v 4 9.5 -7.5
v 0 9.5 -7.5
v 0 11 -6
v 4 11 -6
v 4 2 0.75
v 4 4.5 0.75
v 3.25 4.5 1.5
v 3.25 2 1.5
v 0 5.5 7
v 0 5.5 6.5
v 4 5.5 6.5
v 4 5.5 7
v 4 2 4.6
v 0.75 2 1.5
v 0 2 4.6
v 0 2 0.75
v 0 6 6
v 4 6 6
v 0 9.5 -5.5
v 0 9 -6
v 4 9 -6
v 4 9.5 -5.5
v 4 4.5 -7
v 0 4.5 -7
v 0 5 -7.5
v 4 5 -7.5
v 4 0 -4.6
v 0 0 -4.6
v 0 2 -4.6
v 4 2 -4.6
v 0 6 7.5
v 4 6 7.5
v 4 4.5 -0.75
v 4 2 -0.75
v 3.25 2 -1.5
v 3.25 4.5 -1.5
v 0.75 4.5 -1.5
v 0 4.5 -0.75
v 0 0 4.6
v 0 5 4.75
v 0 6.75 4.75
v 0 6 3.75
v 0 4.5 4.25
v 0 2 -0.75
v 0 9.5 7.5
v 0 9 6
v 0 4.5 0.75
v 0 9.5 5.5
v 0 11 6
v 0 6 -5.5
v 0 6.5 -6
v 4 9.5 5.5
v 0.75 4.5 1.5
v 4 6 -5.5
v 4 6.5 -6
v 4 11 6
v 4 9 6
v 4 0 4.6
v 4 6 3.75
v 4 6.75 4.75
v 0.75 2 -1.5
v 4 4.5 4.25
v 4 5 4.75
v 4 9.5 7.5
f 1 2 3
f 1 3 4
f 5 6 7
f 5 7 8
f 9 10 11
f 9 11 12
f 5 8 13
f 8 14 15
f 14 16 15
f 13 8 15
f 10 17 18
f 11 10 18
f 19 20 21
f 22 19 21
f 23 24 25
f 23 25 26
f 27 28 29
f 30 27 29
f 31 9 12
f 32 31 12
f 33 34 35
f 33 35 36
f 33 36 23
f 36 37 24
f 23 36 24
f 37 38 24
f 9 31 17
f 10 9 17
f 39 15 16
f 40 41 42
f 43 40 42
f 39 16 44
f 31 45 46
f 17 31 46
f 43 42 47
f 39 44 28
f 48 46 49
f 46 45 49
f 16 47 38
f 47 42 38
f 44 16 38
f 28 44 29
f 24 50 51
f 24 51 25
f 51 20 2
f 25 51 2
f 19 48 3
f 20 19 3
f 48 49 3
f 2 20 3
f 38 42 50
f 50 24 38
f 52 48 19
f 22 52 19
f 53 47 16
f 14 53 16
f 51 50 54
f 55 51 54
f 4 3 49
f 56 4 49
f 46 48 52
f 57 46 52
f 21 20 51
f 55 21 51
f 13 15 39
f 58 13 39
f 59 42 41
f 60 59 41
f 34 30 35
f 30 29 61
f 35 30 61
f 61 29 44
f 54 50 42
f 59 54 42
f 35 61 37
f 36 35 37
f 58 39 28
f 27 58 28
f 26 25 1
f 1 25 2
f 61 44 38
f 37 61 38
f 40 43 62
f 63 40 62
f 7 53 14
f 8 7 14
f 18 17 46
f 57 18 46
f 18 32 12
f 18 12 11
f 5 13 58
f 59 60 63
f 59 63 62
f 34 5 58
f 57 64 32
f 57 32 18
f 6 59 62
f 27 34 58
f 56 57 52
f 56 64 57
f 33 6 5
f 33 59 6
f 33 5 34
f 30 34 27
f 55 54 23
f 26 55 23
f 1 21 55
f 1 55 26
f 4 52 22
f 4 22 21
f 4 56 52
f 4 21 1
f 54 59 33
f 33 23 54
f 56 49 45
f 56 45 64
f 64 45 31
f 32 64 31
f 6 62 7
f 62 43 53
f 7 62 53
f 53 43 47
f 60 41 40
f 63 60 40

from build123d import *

# Parameters (mm, degrees)
BOSS_EXTRUDE1_DEPTH = 4
CHAMFER1_SIZE       = 0.75
SKETCH2_W           = 1.5
SKETCH2_H           = 1
CUT_EXTRUDE1_DEPTH  = 14.901438774
CHAMFER2_SIZE       = 1.5
CHAMFER3_SIZE       = 0.5


with BuildPart() as part:
    # Sketch1 → Boss-Extrude1 (new body)
    with BuildSketch(Plane(origin=(0, 0, 0), x_dir=(0, 0, -1), z_dir=(1, 0, 0))):
        Polygon((-4.6, 0), (4.6, 0), (4.6, 2), (1.5, 2), (1.5, 4.5), (7.5, 4.5), (7.5, 11), (-7.5, 11), (-7.5, 4.5), (-6, 4.5), (-6, 6), (-6, 9.5), (6, 9.5), (6, 6), (-3.75, 6), (-4.75, 6.75), (-4.75, 6), (-4.75, 4.5), (-1.5, 4.5), (-1.5, 2), (-4.6, 2), align=None)
    extrude(amount=BOSS_EXTRUDE1_DEPTH)

    # Chamfer1
    chamfer1_edges = [part.edges().sort_by_distance(p)[0] for p in [
        (0, 3.25, 1.5),
        (0, 3.25, -1.5),
        (4, 3.25, 1.5),
        (4, 3.25, -1.5),
    ]]
    chamfer(chamfer1_edges, length=CHAMFER1_SIZE)

    # Sketch2 → Cut-Extrude1 (cut, through all)
    with BuildSketch(Plane.ZY):
        with Locations((6.75, 5)):
            Rectangle(SKETCH2_W, SKETCH2_H)
    extrude(amount=-CUT_EXTRUDE1_DEPTH, mode=Mode.SUBTRACT)

    # Chamfer2
    chamfer2_edges = [part.edges().sort_by_distance(p)[0] for p in [
        (2, 11, 7.5),
        (2, 11, -7.5),
    ]]
    chamfer(chamfer2_edges, length=CHAMFER2_SIZE)

    # Chamfer3
    chamfer3_edges = [part.edges().sort_by_distance(p)[0] for p in [
        (2, 5.5, 6),
        (2, 5.5, 7.5),
        (2, 4.5, 4.75),
        (2, 6, -6),
        (2, 9.5, -6),
        (2, 9.5, 6),
        (2, 4.5, -7.5),
    ]]
    chamfer(chamfer3_edges, length=CHAMFER3_SIZE)


solid = part.part
